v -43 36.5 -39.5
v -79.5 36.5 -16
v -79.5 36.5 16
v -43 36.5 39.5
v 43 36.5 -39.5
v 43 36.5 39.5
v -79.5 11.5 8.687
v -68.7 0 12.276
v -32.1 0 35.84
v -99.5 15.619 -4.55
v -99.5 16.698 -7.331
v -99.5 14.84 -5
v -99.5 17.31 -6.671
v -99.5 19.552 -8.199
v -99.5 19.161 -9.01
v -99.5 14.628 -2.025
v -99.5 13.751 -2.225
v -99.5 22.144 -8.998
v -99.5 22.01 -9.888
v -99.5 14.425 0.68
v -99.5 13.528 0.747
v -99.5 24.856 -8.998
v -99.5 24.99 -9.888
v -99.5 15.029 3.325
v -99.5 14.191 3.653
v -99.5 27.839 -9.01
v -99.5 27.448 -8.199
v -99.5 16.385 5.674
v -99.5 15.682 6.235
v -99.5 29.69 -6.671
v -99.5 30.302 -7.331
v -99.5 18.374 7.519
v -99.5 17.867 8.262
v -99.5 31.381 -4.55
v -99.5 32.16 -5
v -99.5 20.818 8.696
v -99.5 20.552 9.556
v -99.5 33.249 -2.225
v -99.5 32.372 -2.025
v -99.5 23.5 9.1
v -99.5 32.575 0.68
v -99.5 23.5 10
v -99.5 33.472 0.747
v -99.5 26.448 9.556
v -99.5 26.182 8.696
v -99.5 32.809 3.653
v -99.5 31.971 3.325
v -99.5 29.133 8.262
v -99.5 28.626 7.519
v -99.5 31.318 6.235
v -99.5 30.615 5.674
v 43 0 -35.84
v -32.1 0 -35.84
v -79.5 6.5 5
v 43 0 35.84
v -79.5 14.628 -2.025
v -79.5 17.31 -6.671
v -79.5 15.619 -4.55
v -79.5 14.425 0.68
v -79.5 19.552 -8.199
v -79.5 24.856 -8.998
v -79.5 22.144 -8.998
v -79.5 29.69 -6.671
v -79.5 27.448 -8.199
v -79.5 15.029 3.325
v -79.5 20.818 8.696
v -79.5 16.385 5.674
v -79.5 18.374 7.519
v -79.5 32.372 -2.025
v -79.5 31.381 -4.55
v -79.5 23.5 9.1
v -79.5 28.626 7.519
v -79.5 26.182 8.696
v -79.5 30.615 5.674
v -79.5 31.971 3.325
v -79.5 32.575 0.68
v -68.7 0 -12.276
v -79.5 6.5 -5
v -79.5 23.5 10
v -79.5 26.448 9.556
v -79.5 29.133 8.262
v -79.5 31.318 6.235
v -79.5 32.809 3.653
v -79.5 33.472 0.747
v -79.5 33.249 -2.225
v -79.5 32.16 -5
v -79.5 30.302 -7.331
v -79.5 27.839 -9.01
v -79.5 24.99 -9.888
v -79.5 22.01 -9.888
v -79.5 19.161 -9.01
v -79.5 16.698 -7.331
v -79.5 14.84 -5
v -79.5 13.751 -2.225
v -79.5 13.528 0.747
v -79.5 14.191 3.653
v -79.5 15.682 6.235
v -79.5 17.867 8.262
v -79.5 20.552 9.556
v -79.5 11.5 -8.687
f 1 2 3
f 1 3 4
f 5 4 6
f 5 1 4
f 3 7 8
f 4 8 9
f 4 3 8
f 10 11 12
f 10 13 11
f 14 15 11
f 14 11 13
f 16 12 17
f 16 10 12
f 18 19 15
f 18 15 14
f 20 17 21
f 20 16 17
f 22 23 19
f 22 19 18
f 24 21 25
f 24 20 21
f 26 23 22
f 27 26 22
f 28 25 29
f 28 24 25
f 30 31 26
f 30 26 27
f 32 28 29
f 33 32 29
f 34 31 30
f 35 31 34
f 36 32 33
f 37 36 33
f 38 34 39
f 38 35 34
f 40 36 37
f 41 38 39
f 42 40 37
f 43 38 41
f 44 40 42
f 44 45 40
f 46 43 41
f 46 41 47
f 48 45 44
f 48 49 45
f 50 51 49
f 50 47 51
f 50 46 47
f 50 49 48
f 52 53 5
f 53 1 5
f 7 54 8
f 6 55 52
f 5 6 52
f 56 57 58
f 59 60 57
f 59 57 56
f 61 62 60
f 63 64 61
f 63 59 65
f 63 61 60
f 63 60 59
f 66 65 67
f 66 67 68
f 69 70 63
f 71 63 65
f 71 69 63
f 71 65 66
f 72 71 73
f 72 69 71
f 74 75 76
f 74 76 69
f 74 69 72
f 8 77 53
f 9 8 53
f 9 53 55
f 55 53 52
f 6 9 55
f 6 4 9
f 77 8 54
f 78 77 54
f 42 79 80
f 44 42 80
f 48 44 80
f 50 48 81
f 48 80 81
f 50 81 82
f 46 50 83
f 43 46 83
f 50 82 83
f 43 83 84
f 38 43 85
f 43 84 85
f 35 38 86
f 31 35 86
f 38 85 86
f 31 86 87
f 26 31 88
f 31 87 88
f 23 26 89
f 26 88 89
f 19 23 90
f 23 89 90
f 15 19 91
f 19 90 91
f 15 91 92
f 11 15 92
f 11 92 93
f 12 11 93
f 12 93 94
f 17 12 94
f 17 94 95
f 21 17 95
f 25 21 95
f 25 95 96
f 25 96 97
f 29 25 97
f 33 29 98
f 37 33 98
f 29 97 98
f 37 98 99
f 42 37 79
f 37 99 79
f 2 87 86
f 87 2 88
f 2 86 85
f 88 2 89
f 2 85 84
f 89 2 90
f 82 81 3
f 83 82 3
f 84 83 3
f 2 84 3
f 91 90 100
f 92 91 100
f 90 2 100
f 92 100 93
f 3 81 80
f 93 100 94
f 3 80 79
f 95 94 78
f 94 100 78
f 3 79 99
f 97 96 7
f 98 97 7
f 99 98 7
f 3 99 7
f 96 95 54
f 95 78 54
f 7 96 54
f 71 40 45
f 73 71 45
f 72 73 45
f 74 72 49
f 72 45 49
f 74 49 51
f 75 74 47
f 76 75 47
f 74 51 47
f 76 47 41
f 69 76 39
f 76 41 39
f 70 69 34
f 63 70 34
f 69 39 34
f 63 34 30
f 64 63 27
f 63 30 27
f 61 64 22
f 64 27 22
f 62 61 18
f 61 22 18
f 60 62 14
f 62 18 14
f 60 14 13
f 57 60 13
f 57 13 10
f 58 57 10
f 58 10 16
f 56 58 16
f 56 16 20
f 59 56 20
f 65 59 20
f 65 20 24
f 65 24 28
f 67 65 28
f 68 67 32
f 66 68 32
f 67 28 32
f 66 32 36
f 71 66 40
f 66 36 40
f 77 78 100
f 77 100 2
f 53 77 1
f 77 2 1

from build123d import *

# Parameters (mm, degrees)
SKETCH1_W           = 86
SKETCH1_H           = 79
BOSS_EXTRUDE1_DEPTH = 36.5
CUT_EXTRUDE4_DEPTH  = 113.8543313
CUT_EXTRUDE6_DEPTH  = 117.39336237
SKETCH23_W          = 52.496433732
SKETCH23_H          = 95.180046085
CUT_EXTRUDE9_DEPTH  = 99.910462918
SKETCH26_W          = 80.038892534
SKETCH26_H          = 43.235962509
CUT_EXTRUDE10_DEPTH = 122.988754281
SKETCH27_R          = 10
BOSS_EXTRUDE2_DEPTH = 20
SKETCH28_R          = 9.1
CUT_EXTRUDE11_DEPTH = 20


with BuildPart() as part:
    # Sketch1 → Boss-Extrude1 (new body)
    with BuildSketch(Plane(origin=(0, 0, 0), x_dir=(1, 0, 0), z_dir=(0, 1, 0))):
        Polygon((-79.5, 16), (-79.5, -16), (-43, -39.5), (-43, 39.5), align=None)
        Rectangle(SKETCH1_W, SKETCH1_H)
    extrude(amount=BOSS_EXTRUDE1_DEPTH)

    # Sketch14 → Cut-Extrude4 (cut, through all)
    with BuildSketch(Plane(origin=(-24.252710924, -11.01949414, 37.669104201), x_dir=(0.8506873519118823, -0.14759139817848807, 0.5045273119275789), z_dir=(-0.5256719788015616, -0.23884502264638724, 0.8164692436705117))):
        Polygon((-9.224645292, 10.062781894), (-22.037813345, 46.122121953), (-64.94429352, 39.524095052), (-109.490464552, 32.673921521), (-56.610292459, -14.345266084), align=None)
    cut_extrude4 = extrude(amount=CUT_EXTRUDE4_DEPTH, mode=Mode.SUBTRACT)

    # Sketch15 → Cut-Extrude6 (cut, through all)
    with BuildSketch(Plane(origin=(0, -3.557773101, 35.48359566), x_dir=(1, 0, 0), z_dir=(0, -0.0997650710839227, 0.9950110203367698))):
        Polygon((43, 3.575611755), (43, 40.25862255), (-43, 40.25862255), (-38.621652742, -4.136841908), align=None)
    cut_extrude6 = extrude(amount=CUT_EXTRUDE6_DEPTH, mode=Mode.SUBTRACT)

    # Mirror7: Cut-Extrude4, Cut-Extrude6 across plane
    add(cut_extrude4.mirror(Plane.XY), mode=Mode.SUBTRACT)
    add(cut_extrude6.mirror(Plane.XY), mode=Mode.SUBTRACT)

    # Sketch23 → Cut-Extrude9 (cut, through all)
    with BuildSketch(Plane(origin=(-18.267826798, -30.352696834, 0), x_dir=(-0.8567921384922006, 0.515661935203639, 0), z_dir=(-0.515661935203639, -0.8567921384922006, 0))):
        with Locations((54.636530777, 2.381508201)):
            Rectangle(SKETCH23_W, SKETCH23_H)
    extrude(amount=CUT_EXTRUDE9_DEPTH, mode=Mode.SUBTRACT)

    # Sketch26 → Cut-Extrude10 (cut, through all)
    with BuildSketch(Plane(origin=(-35.634500138, -23.512575375, 31.888811139), x_dir=(0.4994950200350479, 0.3295798808101732, 0.8011752786533913), z_dir=(-0.6687218639205573, -0.4412401793127581, 0.598429756007053))):
        with Locations((-7.20146585, 56.642835767)):
            Rectangle(SKETCH26_W, SKETCH26_H)
    cut_extrude10 = extrude(amount=CUT_EXTRUDE10_DEPTH, mode=Mode.SUBTRACT)

    # Mirror9: Cut-Extrude10 across plane
    add(cut_extrude10.mirror(Plane.XY), mode=Mode.SUBTRACT)

    # Sketch27 → Boss-Extrude2 (add)
    with BuildSketch(Plane.ZY.offset(79.5)):
        with Locations((0, 23.5)):
            Circle(SKETCH27_R)
    extrude(amount=BOSS_EXTRUDE2_DEPTH)

    # Sketch28 → Cut-Extrude11 (cut)
    with BuildSketch(Plane.ZY.offset(99.5)):
        with Locations((0, 23.5)):
            Circle(SKETCH28_R)
    extrude(amount=-CUT_EXTRUDE11_DEPTH, mode=Mode.SUBTRACT)


solid = part.part
